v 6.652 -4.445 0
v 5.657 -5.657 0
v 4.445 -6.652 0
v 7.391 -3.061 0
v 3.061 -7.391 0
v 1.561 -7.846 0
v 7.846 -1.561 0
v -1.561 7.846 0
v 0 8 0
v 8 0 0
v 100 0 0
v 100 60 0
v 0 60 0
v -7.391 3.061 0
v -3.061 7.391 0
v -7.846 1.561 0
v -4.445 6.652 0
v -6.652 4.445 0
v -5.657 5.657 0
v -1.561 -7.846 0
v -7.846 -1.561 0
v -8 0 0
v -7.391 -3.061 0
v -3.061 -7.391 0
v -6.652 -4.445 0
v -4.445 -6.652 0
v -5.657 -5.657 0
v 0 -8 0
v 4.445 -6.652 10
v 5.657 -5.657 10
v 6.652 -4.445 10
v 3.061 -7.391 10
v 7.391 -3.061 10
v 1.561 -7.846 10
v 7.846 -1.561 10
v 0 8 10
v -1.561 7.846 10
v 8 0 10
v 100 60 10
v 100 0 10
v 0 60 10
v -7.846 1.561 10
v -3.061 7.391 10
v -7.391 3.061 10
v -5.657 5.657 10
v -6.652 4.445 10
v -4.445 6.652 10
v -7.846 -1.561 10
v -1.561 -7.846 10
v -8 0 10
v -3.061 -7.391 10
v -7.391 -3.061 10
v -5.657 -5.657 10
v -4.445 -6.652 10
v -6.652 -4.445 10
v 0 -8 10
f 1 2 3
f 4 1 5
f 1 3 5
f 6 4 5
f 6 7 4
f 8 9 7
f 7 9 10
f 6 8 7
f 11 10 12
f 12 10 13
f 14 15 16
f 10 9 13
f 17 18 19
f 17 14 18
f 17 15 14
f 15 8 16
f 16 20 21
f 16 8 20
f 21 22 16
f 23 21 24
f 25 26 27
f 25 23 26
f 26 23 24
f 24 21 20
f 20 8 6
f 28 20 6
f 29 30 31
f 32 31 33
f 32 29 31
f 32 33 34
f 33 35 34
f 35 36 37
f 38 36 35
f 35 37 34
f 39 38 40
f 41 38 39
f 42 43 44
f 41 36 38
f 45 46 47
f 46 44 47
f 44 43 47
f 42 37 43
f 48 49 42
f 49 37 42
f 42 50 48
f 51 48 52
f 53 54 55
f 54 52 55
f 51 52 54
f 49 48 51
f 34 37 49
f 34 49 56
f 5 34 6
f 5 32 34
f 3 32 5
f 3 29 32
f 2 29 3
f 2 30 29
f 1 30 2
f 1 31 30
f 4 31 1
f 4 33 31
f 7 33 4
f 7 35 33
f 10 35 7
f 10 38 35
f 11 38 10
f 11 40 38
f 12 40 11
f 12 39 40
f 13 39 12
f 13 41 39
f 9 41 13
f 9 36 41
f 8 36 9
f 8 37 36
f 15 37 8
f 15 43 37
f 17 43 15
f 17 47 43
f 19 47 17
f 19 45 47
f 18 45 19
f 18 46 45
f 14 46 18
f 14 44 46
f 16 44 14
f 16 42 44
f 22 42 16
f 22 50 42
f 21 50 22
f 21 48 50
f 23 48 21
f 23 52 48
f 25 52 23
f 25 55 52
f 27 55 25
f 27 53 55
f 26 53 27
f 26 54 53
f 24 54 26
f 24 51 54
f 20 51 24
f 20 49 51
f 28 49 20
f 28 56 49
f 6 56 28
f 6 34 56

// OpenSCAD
module shape() {
    polygon([[0,0],[100,0],[100,60],[0,60]]);
    circle(8, center=true, $fn=32);
    translate([20, 30]) circle(8, center=true, $fn=32);
    translate([80, 30]) circle(8, center=true, $fn=32);
}

linear_extrude(height=10) shape();
